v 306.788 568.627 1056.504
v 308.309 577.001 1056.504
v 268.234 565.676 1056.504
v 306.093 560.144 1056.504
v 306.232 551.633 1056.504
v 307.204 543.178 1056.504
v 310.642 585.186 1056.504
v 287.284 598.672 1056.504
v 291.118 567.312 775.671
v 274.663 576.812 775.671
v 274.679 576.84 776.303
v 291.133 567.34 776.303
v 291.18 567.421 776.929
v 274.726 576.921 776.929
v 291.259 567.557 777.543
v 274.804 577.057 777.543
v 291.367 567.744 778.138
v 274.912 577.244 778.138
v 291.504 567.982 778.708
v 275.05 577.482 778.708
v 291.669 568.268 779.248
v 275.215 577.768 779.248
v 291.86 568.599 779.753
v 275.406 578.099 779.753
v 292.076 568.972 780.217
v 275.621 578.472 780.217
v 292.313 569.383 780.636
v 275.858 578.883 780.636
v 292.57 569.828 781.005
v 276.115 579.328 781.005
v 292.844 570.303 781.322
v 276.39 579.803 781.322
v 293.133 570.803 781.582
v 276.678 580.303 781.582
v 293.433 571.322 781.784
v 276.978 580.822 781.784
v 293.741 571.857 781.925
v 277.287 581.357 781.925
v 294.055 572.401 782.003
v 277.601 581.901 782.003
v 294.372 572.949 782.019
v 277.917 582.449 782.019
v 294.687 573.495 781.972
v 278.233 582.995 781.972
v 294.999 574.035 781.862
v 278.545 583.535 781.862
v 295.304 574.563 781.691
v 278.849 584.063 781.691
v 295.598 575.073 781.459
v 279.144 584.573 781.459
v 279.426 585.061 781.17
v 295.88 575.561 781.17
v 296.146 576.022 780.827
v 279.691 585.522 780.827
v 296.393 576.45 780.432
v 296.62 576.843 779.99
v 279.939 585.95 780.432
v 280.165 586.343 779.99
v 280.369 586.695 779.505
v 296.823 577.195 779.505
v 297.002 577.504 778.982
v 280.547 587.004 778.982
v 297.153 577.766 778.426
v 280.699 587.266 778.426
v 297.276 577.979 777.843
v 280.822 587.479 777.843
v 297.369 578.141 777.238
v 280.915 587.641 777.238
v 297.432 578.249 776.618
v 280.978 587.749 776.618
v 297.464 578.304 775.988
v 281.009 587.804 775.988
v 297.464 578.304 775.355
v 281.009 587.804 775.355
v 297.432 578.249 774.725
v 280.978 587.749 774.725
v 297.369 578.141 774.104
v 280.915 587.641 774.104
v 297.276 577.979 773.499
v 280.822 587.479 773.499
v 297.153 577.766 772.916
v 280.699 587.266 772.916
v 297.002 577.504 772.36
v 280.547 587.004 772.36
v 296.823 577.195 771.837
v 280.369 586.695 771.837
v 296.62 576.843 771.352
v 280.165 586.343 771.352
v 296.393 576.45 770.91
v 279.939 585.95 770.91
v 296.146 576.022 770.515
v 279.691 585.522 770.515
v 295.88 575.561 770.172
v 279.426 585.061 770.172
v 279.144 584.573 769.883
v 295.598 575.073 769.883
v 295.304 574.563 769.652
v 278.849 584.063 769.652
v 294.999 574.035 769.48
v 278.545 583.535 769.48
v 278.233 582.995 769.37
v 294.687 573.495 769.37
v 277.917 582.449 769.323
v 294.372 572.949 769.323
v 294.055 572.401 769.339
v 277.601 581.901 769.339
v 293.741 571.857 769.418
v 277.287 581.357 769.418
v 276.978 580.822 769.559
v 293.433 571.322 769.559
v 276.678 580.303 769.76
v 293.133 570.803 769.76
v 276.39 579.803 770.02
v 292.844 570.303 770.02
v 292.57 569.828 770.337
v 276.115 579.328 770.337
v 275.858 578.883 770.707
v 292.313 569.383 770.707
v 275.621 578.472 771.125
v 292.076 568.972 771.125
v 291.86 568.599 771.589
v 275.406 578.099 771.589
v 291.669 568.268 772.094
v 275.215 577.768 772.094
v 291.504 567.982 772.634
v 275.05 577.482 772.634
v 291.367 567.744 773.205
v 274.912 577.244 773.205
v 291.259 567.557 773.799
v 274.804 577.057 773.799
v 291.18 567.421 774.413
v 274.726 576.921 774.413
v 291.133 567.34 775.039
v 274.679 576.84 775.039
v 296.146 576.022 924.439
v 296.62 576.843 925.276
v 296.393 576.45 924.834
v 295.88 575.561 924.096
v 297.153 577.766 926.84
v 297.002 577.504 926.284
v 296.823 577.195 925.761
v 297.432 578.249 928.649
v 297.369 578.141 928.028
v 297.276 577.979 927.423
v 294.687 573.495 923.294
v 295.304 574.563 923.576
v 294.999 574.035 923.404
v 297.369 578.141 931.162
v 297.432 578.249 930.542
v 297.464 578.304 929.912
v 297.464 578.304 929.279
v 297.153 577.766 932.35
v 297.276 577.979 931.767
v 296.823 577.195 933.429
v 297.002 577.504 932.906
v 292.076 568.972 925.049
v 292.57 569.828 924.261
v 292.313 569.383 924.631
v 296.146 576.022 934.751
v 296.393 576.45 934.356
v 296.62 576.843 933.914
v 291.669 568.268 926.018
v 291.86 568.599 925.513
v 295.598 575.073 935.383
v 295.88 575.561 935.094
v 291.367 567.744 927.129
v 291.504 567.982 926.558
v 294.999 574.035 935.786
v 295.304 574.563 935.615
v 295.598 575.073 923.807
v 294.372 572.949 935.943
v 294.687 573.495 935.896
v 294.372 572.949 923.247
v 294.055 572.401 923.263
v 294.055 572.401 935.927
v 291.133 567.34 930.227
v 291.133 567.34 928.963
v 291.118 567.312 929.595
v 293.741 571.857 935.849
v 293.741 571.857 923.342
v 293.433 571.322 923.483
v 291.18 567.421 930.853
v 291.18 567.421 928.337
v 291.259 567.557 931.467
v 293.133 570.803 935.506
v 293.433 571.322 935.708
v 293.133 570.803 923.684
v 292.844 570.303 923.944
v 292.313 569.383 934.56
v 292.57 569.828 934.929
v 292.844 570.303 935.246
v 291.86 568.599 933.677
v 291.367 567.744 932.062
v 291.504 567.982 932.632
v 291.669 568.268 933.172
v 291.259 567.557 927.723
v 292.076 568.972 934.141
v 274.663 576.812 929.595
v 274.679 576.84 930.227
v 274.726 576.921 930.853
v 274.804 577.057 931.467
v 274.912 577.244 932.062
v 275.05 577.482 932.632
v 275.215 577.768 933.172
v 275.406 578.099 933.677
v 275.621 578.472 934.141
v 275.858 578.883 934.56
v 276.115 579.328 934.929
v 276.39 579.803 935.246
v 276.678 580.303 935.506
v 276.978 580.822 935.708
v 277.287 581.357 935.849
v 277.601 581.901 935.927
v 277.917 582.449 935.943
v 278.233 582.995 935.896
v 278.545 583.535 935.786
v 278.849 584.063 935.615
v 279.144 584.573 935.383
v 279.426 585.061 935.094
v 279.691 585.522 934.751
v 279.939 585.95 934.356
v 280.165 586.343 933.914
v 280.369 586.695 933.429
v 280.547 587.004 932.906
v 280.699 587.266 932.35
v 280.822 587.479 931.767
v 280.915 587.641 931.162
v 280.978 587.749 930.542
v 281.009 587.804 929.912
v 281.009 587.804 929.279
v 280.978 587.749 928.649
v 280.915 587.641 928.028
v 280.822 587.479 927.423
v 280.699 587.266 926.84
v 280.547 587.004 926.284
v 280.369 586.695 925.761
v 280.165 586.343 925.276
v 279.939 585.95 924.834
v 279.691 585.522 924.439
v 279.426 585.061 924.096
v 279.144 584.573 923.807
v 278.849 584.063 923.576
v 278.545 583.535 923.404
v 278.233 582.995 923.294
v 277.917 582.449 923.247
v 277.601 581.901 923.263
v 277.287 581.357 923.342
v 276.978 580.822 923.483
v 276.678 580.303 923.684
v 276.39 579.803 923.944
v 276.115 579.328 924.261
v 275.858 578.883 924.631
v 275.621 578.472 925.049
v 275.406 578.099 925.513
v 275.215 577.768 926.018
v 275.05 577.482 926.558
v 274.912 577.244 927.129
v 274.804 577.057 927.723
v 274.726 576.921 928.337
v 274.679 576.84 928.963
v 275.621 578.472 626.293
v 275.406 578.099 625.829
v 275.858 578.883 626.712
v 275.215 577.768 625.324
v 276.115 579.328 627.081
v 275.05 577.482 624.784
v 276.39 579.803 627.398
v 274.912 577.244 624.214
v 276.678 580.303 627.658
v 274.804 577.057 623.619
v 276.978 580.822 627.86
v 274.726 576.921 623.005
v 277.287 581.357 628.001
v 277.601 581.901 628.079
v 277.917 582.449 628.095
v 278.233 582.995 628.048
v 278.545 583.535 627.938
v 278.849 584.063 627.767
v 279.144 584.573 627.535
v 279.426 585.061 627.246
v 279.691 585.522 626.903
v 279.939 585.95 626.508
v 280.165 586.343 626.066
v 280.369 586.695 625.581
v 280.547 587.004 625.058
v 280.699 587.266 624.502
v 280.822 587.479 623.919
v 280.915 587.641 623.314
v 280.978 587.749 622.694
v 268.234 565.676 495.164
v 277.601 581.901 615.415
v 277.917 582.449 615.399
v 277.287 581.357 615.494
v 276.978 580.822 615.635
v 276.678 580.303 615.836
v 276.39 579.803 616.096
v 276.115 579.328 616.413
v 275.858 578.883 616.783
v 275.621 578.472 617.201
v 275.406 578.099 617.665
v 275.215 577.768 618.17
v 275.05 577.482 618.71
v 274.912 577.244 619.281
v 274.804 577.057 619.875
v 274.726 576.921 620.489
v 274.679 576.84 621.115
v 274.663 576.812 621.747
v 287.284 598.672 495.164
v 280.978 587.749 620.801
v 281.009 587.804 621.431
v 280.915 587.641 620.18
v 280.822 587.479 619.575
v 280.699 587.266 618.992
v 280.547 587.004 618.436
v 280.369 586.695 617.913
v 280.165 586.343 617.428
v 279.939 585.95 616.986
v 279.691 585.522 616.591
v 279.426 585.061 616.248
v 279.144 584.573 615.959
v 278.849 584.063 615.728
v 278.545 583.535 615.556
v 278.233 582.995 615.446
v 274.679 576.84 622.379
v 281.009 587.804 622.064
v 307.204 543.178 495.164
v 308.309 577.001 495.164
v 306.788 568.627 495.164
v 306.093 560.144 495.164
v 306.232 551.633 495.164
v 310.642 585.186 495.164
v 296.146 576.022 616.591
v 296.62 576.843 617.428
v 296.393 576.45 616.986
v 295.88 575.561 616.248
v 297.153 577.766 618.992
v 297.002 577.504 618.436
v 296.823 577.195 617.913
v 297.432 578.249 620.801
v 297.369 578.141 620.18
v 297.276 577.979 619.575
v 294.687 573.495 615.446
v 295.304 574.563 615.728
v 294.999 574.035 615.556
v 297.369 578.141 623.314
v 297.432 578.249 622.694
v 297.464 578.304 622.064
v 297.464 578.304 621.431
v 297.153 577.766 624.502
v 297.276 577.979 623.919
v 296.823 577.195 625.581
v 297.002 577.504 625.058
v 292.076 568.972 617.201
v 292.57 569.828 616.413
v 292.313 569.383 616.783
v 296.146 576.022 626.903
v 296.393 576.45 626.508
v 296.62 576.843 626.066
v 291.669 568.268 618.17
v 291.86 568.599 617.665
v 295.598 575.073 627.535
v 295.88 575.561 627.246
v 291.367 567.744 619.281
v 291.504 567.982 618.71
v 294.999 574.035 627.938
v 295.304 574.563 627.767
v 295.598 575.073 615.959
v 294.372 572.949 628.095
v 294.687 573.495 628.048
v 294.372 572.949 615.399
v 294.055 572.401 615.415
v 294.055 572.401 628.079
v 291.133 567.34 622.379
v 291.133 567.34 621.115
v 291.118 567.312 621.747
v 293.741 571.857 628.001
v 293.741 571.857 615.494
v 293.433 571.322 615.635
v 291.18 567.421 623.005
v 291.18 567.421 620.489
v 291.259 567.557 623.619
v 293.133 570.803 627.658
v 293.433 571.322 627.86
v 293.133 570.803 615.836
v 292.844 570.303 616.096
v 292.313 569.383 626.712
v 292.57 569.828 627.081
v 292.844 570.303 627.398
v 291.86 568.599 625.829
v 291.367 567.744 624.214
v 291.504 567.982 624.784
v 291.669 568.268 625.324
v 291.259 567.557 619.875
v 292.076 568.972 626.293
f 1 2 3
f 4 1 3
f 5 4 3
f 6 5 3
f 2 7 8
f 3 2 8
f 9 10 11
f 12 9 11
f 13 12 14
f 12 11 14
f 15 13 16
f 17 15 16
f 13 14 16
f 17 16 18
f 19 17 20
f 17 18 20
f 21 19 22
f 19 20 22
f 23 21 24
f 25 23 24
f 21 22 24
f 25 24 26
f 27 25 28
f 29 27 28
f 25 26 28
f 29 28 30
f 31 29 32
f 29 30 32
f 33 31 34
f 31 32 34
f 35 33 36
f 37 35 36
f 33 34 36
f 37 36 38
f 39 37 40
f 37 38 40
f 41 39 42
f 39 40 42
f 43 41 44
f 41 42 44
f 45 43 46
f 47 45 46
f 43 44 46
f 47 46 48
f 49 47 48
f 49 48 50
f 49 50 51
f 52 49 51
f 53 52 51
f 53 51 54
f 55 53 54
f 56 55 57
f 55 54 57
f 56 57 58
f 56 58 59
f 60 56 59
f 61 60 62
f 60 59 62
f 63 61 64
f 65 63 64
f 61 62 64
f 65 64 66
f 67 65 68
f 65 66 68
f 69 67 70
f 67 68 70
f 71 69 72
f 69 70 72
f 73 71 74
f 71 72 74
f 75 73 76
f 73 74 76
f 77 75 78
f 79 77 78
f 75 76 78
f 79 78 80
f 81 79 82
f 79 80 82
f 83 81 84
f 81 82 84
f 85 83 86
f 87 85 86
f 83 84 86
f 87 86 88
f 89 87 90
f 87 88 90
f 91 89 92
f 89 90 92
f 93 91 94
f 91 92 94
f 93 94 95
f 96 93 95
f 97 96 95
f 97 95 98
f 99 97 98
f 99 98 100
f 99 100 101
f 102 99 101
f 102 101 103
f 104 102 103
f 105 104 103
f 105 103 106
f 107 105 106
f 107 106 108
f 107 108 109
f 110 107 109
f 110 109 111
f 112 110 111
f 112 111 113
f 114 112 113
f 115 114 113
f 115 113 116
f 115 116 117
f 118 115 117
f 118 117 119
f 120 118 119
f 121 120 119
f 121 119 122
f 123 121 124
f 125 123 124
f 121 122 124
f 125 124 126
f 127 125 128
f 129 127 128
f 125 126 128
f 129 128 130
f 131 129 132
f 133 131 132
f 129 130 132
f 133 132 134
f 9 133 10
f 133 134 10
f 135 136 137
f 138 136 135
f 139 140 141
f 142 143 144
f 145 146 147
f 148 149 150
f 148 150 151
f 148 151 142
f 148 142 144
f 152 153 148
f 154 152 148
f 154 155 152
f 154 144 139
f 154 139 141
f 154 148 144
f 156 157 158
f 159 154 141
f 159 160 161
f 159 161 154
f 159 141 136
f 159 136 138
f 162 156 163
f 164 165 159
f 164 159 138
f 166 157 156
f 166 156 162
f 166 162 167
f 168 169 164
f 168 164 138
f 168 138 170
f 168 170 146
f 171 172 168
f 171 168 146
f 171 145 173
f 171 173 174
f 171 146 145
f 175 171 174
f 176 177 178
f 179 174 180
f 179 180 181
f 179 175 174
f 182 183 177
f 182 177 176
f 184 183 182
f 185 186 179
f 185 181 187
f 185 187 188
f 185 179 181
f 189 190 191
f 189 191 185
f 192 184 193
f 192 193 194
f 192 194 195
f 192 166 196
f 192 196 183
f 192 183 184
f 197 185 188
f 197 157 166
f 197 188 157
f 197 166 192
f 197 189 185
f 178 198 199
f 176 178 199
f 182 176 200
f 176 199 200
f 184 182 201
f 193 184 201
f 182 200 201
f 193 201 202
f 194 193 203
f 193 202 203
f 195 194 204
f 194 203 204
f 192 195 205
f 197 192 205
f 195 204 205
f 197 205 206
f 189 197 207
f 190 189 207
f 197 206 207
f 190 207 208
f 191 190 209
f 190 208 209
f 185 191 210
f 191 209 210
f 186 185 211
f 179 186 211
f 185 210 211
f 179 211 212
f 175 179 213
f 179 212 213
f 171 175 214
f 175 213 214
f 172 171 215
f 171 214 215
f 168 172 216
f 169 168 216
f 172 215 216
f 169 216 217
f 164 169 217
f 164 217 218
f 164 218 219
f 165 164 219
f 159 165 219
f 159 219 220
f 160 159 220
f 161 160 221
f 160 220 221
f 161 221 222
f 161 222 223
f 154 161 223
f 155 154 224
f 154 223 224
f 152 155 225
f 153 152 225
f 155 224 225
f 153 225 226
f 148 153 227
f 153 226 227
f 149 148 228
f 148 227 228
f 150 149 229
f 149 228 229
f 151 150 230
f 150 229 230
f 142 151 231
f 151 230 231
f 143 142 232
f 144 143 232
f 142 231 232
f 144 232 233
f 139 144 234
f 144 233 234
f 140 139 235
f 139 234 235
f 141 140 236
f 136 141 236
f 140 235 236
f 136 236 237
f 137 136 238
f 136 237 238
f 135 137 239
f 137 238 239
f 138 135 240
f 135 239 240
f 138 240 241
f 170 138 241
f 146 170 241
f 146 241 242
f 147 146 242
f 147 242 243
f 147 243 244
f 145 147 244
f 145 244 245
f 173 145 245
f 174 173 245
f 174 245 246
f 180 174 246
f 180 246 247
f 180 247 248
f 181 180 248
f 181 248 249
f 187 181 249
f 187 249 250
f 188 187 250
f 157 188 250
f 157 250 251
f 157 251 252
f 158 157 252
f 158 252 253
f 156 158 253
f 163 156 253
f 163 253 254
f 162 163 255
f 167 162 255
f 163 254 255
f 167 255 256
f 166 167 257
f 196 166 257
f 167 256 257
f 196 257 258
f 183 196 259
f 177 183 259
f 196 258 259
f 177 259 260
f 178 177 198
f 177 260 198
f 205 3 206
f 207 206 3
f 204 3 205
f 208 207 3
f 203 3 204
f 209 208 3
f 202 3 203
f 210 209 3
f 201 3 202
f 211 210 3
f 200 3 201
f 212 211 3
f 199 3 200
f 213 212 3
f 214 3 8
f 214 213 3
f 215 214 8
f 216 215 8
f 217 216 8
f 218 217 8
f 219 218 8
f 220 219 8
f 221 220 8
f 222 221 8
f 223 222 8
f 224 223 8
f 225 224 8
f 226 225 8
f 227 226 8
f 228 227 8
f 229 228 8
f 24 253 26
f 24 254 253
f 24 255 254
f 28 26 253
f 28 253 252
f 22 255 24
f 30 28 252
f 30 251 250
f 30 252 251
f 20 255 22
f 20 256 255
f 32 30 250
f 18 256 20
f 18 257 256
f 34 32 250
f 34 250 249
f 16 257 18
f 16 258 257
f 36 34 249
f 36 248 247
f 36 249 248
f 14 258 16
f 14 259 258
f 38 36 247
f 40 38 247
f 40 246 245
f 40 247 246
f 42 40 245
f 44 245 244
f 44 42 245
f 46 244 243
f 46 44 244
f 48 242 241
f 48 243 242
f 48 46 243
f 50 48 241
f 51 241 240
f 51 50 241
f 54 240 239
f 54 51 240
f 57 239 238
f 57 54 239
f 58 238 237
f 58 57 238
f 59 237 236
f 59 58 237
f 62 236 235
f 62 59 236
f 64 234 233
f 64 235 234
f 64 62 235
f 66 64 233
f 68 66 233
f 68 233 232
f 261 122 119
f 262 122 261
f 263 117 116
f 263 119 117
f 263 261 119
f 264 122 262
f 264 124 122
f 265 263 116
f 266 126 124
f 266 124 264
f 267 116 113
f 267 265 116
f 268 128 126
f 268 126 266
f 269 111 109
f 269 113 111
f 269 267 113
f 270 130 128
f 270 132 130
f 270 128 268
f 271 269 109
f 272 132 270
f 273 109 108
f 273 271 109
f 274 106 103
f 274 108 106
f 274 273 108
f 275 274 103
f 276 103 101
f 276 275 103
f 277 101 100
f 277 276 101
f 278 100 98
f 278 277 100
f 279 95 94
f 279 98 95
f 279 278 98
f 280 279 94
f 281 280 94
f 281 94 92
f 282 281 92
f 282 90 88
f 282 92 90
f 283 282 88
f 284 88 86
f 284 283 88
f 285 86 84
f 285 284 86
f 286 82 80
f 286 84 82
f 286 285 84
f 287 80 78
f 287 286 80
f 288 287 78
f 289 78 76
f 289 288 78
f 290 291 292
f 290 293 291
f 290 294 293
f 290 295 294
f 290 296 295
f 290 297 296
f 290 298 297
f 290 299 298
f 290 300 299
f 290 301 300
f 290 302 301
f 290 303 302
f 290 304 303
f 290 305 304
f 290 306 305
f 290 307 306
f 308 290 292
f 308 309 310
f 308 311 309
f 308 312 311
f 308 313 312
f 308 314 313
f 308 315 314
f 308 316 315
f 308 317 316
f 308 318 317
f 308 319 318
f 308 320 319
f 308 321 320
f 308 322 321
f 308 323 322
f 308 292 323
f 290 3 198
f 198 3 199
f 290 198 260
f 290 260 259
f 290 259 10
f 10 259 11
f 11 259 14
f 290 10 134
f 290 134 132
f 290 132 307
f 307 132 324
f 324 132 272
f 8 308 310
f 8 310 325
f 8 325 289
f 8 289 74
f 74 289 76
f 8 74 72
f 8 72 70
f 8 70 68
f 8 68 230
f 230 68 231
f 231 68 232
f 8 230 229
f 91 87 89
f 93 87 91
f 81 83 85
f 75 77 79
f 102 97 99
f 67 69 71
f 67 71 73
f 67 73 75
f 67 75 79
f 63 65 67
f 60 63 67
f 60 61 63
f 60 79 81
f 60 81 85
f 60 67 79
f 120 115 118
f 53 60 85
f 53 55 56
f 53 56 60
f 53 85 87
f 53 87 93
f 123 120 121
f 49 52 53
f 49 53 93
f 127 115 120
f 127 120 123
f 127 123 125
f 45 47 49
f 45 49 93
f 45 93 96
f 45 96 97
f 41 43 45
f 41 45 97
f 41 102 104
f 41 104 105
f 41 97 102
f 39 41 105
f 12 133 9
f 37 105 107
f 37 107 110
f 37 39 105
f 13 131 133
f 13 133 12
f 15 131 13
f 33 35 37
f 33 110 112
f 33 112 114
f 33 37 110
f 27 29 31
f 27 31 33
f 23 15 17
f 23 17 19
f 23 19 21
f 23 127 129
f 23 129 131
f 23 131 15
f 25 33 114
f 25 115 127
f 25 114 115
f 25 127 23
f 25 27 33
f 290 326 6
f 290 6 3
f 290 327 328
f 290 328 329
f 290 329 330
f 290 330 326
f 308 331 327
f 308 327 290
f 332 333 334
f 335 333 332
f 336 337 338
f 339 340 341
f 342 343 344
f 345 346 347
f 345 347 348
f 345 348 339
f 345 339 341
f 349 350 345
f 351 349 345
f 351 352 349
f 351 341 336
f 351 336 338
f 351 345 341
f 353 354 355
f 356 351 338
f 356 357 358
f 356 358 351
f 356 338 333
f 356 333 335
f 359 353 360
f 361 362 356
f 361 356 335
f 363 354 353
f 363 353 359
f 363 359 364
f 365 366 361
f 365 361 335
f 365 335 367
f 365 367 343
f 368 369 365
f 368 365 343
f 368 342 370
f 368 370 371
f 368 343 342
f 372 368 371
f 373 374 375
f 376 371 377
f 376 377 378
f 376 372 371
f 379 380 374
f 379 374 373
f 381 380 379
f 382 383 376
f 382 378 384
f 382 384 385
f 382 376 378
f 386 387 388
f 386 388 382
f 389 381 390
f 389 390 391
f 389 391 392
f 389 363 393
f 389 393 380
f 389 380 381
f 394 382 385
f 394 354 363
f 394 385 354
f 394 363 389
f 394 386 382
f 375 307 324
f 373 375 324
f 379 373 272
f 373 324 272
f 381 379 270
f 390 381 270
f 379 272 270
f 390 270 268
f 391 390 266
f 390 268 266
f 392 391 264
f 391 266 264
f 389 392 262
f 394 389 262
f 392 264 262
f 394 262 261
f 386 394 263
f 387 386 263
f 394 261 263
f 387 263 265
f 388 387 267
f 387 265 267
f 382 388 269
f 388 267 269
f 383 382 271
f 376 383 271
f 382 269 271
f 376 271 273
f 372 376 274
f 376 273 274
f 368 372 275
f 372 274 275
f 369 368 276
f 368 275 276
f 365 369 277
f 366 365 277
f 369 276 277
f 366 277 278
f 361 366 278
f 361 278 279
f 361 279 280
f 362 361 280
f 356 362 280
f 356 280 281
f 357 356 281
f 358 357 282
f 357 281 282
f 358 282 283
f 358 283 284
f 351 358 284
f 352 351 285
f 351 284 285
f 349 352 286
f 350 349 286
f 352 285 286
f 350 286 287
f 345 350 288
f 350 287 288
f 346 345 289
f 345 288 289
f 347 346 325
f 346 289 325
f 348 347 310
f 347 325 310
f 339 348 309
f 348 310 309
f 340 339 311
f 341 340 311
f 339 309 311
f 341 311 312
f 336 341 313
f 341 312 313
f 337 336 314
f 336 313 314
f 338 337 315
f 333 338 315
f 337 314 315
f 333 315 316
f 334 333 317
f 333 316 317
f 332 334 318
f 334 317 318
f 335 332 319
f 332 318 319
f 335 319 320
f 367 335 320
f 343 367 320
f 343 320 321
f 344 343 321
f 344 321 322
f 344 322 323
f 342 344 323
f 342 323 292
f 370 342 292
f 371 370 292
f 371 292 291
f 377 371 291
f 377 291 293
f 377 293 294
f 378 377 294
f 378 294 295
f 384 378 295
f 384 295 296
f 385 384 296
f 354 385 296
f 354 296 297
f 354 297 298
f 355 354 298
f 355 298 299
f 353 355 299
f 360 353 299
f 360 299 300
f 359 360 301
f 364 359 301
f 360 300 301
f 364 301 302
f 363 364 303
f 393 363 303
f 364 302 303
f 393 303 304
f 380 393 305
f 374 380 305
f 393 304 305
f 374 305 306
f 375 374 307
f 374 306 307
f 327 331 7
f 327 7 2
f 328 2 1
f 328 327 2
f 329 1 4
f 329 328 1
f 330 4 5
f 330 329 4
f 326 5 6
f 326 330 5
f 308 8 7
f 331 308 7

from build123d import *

# Parameters (mm, degrees)
BOSS_EXTRUDE1_DEPTH      = 25.4
BOSS_EXTRUDE1_DEPTH_BACK = 535.94
SKETCH2_R                = 6.35
CUT_EXTRUDE1_DEPTH       = 19


with BuildPart() as part:
    # Sketch1 → Boss-Extrude1 (new, two sides: drawn at the far end of the back side and taken through both)
    with BuildSketch(Plane.XY.offset(1031.10385267).offset(-BOSS_EXTRUDE1_DEPTH_BACK)):
        with BuildLine():
            Line((287.283668248, 598.671970668), (310.642299926, 585.186295534))
            ThreePointArc((310.642299926, 585.186295534), (306.336547982, 564.39371918), (307.203792995, 543.177720091))
            Line((307.203792995, 543.177720091), (268.233668248, 565.676402784))
            Line((268.233668248, 565.676402784), (287.283668248, 598.671970668))
        make_face()
    extrude(amount=BOSS_EXTRUDE1_DEPTH + BOSS_EXTRUDE1_DEPTH_BACK)

    # Sketch2 → Cut-Extrude1 (cut)
    with BuildSketch(Plane(origin=(-43.76981638, 25.270515269, 0), x_dir=(0, 0, 1), z_dir=(-0.8660254037844367, 0.5000000000000036, 0))):
        with Locations(Location((775.671183514, 643.215670872, 0), (0, 0, 270))):
            Circle(SKETCH2_R)
        with Locations(Location((929.595183514, 643.215670872, 0), (0, 0, 270))):
            Circle(SKETCH2_R)
        with Locations(Location((621.747183514, 643.215670872, 0), (0, 0, 270))):
            Circle(SKETCH2_R)
    extrude(amount=-CUT_EXTRUDE1_DEPTH, mode=Mode.SUBTRACT)


solid = part.part
